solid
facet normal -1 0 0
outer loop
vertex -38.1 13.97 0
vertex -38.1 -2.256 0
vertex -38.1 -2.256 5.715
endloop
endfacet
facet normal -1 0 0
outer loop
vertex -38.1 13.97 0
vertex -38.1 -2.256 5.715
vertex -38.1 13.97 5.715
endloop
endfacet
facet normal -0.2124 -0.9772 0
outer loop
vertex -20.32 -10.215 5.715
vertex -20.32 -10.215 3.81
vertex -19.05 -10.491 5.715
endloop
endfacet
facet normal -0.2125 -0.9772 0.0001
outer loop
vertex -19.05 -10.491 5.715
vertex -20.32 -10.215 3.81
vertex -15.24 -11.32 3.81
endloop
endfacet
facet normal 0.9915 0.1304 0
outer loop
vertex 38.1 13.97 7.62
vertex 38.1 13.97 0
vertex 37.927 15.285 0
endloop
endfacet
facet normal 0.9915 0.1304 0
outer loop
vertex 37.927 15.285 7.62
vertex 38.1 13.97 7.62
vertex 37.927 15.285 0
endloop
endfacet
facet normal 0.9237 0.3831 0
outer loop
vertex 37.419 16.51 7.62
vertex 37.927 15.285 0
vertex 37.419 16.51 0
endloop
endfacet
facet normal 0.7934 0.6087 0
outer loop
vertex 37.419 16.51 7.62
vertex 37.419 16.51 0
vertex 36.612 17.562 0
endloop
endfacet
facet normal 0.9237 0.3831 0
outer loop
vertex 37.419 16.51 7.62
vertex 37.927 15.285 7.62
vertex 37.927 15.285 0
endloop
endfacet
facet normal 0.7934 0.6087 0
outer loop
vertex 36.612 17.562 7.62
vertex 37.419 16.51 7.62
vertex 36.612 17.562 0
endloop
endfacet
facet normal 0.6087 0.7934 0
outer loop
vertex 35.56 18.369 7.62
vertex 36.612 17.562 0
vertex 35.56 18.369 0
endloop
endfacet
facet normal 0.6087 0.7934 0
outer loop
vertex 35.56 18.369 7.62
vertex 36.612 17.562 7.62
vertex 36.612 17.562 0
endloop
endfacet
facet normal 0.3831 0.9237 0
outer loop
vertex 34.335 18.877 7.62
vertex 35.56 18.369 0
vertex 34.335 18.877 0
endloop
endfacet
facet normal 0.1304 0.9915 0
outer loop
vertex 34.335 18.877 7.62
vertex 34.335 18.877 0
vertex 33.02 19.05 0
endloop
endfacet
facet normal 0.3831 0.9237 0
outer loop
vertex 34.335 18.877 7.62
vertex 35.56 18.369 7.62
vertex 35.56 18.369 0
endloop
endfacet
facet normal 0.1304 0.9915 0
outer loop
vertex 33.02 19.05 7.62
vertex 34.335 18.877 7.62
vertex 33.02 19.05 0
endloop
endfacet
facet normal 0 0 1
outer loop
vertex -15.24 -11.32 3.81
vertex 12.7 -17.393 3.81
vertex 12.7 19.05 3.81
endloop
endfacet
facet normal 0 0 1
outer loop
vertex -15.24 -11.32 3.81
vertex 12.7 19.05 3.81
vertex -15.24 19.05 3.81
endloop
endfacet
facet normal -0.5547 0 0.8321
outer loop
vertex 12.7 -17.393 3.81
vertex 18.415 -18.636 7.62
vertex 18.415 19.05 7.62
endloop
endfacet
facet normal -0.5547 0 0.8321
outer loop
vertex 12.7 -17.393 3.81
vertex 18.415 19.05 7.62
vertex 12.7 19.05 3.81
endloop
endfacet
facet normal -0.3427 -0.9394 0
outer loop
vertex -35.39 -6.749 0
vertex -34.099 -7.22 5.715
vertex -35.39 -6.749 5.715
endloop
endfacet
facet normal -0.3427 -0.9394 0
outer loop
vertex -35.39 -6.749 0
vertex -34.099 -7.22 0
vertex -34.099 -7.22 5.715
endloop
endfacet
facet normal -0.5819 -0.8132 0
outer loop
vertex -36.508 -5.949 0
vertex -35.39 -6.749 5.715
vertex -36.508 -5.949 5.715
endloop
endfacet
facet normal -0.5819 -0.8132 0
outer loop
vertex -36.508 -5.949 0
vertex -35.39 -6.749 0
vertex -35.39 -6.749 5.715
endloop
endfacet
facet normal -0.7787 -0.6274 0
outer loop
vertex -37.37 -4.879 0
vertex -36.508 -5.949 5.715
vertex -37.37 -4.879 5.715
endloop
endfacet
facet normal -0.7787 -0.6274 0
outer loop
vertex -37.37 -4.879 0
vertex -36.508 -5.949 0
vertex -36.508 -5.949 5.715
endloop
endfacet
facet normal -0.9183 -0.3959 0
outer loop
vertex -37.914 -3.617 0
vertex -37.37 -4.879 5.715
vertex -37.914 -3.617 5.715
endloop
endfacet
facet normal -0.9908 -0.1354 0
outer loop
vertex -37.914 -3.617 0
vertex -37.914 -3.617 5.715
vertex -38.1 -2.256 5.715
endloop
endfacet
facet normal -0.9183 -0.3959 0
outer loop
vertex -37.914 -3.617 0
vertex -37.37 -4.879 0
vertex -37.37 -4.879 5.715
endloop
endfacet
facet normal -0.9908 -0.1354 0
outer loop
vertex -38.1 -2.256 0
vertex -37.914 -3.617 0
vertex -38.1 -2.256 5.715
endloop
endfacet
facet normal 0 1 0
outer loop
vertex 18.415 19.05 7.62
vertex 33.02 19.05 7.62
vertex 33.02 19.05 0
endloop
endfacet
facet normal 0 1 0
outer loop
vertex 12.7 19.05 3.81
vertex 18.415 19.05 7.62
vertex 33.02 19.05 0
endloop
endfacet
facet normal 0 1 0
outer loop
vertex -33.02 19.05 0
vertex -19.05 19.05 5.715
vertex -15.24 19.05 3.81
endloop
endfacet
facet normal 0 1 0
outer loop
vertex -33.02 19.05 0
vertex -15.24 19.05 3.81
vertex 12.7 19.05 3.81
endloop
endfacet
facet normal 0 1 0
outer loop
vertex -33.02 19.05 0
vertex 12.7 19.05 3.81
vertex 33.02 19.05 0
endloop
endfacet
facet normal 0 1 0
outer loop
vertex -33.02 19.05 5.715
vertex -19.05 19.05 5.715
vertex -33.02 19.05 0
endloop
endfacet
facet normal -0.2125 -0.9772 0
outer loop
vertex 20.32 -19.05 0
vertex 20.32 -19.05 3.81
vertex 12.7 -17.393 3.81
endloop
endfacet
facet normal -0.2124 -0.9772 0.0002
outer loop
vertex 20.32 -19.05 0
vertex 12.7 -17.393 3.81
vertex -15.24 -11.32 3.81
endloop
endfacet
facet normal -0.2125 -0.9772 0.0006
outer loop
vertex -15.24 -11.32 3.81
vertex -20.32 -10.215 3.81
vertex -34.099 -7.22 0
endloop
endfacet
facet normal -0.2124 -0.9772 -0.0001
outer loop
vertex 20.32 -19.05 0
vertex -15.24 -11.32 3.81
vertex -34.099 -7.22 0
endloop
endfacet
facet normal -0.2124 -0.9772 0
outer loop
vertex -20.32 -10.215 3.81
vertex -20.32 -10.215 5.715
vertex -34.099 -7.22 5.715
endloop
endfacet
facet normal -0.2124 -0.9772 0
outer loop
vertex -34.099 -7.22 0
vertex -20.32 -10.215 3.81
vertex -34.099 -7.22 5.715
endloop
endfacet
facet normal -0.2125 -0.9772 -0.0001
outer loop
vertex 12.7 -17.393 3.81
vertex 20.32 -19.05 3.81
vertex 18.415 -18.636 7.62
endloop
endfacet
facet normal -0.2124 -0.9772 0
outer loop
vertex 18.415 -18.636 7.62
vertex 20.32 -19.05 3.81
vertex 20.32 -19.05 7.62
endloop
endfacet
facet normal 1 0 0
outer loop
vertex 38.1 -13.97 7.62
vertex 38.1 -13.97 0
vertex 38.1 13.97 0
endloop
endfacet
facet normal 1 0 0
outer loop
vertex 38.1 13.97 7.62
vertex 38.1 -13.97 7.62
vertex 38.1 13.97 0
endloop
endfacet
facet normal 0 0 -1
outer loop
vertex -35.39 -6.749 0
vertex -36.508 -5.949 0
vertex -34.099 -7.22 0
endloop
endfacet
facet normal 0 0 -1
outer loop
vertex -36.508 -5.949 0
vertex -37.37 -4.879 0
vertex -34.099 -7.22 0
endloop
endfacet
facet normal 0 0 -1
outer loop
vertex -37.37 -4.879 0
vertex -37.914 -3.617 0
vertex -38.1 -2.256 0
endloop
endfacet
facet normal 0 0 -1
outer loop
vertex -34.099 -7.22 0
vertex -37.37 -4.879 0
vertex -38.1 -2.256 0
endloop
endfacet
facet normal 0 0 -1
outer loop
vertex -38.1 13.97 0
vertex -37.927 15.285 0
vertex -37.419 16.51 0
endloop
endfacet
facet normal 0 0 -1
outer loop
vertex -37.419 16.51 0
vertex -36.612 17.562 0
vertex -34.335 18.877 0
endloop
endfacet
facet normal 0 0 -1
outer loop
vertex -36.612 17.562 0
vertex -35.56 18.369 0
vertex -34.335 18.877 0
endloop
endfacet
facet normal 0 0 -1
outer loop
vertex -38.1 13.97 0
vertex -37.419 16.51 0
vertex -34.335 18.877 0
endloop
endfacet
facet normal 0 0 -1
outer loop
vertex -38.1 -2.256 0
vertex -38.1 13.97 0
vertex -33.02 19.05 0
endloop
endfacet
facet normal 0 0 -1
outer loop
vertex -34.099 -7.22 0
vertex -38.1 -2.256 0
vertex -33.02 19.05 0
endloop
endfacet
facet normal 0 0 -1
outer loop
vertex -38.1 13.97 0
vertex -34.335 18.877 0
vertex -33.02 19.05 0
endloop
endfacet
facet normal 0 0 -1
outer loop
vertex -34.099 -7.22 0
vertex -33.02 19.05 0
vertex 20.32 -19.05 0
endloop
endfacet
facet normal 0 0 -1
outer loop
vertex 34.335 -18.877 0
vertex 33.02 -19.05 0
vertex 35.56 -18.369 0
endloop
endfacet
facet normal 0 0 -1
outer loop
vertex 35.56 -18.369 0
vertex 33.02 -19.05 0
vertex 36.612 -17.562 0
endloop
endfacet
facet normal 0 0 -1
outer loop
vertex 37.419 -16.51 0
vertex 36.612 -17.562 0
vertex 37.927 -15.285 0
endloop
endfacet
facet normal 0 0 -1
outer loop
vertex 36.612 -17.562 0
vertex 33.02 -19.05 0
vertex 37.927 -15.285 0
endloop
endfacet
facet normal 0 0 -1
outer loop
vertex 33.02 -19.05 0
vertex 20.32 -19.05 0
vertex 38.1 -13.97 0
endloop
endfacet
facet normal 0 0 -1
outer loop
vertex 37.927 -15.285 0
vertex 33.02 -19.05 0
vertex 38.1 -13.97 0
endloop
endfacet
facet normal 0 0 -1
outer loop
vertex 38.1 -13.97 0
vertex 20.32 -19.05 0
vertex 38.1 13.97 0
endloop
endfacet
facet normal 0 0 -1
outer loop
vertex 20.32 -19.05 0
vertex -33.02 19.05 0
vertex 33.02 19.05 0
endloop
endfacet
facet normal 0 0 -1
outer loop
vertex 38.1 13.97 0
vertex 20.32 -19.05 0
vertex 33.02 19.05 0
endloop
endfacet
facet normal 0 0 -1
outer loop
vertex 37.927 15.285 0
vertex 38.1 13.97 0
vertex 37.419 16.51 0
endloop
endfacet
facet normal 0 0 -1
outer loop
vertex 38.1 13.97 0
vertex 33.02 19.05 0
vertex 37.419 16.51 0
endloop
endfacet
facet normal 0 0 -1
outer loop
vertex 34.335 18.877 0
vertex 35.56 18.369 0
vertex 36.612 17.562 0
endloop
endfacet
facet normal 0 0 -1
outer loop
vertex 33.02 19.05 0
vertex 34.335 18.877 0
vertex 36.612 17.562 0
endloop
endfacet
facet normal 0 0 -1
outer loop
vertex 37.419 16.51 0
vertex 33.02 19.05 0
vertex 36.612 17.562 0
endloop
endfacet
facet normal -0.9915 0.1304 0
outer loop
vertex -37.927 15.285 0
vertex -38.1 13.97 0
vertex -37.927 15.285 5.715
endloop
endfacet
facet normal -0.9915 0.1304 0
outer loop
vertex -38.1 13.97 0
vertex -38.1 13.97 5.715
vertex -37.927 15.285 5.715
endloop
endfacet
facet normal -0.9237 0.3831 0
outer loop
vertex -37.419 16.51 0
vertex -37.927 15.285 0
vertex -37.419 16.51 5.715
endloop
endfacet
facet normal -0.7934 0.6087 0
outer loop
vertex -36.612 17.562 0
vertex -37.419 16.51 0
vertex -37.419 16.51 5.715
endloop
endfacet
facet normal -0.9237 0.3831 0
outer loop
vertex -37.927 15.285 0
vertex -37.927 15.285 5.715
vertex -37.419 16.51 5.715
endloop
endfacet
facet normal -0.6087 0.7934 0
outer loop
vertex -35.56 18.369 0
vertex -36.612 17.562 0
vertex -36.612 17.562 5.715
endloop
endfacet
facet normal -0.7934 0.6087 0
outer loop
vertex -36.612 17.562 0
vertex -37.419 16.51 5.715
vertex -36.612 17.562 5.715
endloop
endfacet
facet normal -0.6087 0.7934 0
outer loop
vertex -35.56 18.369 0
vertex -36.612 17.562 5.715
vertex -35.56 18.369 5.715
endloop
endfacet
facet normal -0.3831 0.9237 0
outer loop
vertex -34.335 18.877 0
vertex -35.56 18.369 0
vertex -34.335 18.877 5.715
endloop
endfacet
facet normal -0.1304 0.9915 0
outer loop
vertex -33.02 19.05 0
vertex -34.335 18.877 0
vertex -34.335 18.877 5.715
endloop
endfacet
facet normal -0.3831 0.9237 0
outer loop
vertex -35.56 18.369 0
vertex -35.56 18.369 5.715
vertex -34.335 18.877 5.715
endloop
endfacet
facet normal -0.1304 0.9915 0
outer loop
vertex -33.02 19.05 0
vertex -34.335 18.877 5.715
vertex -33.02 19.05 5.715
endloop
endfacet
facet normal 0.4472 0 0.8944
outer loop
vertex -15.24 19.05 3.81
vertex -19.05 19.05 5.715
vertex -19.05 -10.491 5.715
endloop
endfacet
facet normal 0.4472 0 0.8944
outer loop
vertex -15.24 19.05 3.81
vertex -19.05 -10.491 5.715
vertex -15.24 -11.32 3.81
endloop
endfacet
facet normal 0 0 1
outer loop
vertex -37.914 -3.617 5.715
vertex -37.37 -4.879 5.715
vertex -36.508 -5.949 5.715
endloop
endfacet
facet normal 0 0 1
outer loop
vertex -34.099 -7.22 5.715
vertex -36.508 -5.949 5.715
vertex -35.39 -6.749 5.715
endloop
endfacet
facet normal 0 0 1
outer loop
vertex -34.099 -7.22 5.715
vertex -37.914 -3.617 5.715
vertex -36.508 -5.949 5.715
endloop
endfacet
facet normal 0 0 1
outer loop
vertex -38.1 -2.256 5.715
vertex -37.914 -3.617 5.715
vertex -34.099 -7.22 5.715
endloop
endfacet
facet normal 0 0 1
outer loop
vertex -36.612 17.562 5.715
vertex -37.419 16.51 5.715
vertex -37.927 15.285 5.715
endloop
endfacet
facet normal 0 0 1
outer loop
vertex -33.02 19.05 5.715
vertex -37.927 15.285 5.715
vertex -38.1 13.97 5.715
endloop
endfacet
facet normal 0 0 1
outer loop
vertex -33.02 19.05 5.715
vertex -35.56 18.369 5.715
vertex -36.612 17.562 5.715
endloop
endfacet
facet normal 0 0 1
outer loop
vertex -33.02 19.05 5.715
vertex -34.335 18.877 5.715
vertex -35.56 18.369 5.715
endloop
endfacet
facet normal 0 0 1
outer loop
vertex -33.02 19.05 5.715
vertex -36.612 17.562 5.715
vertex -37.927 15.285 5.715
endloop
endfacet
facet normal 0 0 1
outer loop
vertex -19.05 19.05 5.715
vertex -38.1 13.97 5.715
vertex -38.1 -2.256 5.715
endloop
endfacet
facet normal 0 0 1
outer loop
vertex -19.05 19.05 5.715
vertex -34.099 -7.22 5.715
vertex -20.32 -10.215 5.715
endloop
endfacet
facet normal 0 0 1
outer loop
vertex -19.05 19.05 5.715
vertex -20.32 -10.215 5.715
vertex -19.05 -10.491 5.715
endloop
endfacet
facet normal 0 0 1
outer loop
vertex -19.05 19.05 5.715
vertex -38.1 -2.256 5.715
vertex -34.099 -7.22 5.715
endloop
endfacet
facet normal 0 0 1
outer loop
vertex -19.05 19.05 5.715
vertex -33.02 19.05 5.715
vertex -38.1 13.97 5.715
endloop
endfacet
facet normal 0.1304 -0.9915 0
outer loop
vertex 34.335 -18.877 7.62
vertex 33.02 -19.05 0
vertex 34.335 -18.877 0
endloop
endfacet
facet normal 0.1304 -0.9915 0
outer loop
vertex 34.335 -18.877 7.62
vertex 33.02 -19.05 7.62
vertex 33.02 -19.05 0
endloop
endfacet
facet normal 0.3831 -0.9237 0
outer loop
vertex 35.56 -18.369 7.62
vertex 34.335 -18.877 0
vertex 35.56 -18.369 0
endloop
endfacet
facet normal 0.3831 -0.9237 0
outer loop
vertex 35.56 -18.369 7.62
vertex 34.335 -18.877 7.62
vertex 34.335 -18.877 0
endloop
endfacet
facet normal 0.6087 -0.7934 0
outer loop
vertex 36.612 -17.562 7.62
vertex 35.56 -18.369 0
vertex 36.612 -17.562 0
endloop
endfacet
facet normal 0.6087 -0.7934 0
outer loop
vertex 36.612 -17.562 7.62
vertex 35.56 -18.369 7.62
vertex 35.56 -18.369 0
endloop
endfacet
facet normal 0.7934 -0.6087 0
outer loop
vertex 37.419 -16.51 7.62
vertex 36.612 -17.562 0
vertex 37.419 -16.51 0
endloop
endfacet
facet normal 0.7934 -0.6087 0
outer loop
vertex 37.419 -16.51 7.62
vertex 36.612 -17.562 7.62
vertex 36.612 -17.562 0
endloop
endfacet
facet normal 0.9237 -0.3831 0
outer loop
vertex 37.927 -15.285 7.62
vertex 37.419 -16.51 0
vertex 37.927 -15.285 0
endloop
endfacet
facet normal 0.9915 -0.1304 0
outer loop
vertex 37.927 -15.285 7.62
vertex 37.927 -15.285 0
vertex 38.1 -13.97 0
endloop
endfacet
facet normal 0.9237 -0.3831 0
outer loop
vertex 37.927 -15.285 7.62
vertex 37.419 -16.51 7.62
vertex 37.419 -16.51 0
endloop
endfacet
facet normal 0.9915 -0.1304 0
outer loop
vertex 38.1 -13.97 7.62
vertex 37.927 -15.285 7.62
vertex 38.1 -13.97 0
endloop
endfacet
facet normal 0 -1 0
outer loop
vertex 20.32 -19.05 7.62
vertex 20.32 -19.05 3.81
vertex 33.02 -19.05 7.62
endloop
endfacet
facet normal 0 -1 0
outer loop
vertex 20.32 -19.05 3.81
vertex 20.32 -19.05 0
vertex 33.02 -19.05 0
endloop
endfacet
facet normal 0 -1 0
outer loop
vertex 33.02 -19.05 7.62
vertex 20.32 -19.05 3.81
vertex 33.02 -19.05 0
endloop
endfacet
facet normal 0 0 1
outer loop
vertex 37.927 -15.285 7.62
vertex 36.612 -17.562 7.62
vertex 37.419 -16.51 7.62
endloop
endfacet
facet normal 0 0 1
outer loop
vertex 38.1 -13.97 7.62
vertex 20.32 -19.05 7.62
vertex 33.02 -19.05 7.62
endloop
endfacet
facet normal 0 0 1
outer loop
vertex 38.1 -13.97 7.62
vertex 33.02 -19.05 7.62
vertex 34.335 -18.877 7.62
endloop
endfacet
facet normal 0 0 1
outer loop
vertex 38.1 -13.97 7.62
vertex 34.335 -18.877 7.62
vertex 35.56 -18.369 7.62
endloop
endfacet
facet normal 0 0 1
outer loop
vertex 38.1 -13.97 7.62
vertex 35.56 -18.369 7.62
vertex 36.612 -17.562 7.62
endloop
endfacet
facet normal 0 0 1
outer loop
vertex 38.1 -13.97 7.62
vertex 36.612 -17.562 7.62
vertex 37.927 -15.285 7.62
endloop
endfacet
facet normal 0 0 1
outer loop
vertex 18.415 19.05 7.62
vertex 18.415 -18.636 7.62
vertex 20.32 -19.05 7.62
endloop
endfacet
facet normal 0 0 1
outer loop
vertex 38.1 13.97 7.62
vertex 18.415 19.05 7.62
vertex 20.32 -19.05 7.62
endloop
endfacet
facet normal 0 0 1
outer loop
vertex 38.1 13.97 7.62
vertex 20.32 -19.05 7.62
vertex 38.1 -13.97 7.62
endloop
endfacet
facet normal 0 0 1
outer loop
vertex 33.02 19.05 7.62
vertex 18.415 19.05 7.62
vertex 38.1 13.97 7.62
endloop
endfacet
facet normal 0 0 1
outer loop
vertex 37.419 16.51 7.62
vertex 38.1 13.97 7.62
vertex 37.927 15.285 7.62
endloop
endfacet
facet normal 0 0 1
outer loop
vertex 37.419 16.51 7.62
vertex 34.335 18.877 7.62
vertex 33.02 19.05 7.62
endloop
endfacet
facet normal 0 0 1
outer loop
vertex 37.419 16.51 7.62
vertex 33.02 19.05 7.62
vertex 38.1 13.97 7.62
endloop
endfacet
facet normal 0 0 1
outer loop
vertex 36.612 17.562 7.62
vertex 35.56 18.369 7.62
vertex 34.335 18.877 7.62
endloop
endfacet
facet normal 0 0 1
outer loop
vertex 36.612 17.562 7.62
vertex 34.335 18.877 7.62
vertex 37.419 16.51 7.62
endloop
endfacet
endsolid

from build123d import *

# Parameters (mm, degrees)
F0_W        = 76.2
F0_H        = 38.1
F1_DEPTH    = 7.62
F4_DEPTH    = 7.621
F6_DEPTH    = 38.101
F7_T4_DEPTH = 38.1
F8_T4_DEPTH = 42.4215480701
F9_R        = 5.08


# Not quite as in the source:
# - a fillet or chamfer that OpenCascade refuses, or shapes differently, is made with other operations: its cross-section is extruded or revolved along the edge and cut away or added
# - a feature names something its author has since deleted; it is built from what else it names


with BuildPart() as f1:
    # F0 (on Top) → F1 (new body)
    with BuildSketch(Plane.XY):
        Rectangle(F0_W, F0_H)
    extrude(amount=F1_DEPTH)

    # F3 (on face) → F4 (cut, through all)
    with BuildSketch(Plane.XY.offset(7.62)):
        Polygon((-38.1, -6.35), (-38.1, -19.05), (-20.32, -19.05), (20.32, -19.05), align=None)
    extrude(amount=-F4_DEPTH, mode=Mode.SUBTRACT)

    # F5 (on face) → F6 (cut, through all)
    with BuildSketch(Plane(origin=(0, 19.05, 0), x_dir=(-1, 0, 0), z_dir=(0, 1, 0))):
        Polygon((38.1, 7.62), (-20.32, 7.62), (-20.32, 3.81), (20.32, 3.81), (20.32, 5.715), (38.1, 5.715), align=None)
    extrude(amount=-F6_DEPTH, mode=Mode.SUBTRACT)

    # F7: chamfer of 7.62 x 5.08 on 1 edges, made by hand


with BuildPart() as f7_tool2:
    # F7_s3 → F7_t4 (new body)
    with BuildSketch(Plane.XZ.offset(-19.05)):
        Polygon((20.32, 8.89), (12.7, 3.81), (20.32, 3.81), align=None)
    extrude(amount=F7_T4_DEPTH)

    split(bisect_by=Plane.XY.offset(7.62), keep=Keep.BOTTOM)

    split(bisect_by=Plane(origin=(-3.0374548736, -13.9722924188, 0), x_dir=(0, 0, 1), z_dir=(0.2124296443, 0.9771763639, 0)), keep=Keep.TOP)


with BuildPart() as f1_1:
    add(f1.part)

    # F7_t1: union F7_tool2
    add(f7_tool2.part)

    # F8: chamfer of 2.54 x 5.08 on 1 edges, made by hand


with BuildPart() as f8_tool2:
    # F8_s3 → F8_t4 (new body)
    with BuildSketch(Plane.XZ.offset(-19.05)):
        Polygon((-20.32, 6.35), (-15.24, 3.81), (-20.32, 3.81), align=None)
    extrude(amount=F8_T4_DEPTH)

    split(bisect_by=Plane.XY.offset(5.715), keep=Keep.BOTTOM)

    split(bisect_by=Plane(origin=(-3.0374548736, -13.9722924188, 0), x_dir=(0, 0, 1), z_dir=(0.2124296443, 0.9771763639, 0)), keep=Keep.TOP)


with BuildPart() as f1_2:
    add(f1_1.part)

    # F8_t1: union F8_tool2
    add(f8_tool2.part)

    # F9
    f9_edges = [f1_2.edges().sort_by_distance(p)[0] for p in [
        (-38.1, -6.35, 2.8575),
        (-38.1, 19.05, 2.8575),
        (38.1, -19.05, 3.81),
        (38.1, 19.05, 3.81),
    ]]
    fillet(f9_edges, radius=F9_R)


solid = f1_2.part
